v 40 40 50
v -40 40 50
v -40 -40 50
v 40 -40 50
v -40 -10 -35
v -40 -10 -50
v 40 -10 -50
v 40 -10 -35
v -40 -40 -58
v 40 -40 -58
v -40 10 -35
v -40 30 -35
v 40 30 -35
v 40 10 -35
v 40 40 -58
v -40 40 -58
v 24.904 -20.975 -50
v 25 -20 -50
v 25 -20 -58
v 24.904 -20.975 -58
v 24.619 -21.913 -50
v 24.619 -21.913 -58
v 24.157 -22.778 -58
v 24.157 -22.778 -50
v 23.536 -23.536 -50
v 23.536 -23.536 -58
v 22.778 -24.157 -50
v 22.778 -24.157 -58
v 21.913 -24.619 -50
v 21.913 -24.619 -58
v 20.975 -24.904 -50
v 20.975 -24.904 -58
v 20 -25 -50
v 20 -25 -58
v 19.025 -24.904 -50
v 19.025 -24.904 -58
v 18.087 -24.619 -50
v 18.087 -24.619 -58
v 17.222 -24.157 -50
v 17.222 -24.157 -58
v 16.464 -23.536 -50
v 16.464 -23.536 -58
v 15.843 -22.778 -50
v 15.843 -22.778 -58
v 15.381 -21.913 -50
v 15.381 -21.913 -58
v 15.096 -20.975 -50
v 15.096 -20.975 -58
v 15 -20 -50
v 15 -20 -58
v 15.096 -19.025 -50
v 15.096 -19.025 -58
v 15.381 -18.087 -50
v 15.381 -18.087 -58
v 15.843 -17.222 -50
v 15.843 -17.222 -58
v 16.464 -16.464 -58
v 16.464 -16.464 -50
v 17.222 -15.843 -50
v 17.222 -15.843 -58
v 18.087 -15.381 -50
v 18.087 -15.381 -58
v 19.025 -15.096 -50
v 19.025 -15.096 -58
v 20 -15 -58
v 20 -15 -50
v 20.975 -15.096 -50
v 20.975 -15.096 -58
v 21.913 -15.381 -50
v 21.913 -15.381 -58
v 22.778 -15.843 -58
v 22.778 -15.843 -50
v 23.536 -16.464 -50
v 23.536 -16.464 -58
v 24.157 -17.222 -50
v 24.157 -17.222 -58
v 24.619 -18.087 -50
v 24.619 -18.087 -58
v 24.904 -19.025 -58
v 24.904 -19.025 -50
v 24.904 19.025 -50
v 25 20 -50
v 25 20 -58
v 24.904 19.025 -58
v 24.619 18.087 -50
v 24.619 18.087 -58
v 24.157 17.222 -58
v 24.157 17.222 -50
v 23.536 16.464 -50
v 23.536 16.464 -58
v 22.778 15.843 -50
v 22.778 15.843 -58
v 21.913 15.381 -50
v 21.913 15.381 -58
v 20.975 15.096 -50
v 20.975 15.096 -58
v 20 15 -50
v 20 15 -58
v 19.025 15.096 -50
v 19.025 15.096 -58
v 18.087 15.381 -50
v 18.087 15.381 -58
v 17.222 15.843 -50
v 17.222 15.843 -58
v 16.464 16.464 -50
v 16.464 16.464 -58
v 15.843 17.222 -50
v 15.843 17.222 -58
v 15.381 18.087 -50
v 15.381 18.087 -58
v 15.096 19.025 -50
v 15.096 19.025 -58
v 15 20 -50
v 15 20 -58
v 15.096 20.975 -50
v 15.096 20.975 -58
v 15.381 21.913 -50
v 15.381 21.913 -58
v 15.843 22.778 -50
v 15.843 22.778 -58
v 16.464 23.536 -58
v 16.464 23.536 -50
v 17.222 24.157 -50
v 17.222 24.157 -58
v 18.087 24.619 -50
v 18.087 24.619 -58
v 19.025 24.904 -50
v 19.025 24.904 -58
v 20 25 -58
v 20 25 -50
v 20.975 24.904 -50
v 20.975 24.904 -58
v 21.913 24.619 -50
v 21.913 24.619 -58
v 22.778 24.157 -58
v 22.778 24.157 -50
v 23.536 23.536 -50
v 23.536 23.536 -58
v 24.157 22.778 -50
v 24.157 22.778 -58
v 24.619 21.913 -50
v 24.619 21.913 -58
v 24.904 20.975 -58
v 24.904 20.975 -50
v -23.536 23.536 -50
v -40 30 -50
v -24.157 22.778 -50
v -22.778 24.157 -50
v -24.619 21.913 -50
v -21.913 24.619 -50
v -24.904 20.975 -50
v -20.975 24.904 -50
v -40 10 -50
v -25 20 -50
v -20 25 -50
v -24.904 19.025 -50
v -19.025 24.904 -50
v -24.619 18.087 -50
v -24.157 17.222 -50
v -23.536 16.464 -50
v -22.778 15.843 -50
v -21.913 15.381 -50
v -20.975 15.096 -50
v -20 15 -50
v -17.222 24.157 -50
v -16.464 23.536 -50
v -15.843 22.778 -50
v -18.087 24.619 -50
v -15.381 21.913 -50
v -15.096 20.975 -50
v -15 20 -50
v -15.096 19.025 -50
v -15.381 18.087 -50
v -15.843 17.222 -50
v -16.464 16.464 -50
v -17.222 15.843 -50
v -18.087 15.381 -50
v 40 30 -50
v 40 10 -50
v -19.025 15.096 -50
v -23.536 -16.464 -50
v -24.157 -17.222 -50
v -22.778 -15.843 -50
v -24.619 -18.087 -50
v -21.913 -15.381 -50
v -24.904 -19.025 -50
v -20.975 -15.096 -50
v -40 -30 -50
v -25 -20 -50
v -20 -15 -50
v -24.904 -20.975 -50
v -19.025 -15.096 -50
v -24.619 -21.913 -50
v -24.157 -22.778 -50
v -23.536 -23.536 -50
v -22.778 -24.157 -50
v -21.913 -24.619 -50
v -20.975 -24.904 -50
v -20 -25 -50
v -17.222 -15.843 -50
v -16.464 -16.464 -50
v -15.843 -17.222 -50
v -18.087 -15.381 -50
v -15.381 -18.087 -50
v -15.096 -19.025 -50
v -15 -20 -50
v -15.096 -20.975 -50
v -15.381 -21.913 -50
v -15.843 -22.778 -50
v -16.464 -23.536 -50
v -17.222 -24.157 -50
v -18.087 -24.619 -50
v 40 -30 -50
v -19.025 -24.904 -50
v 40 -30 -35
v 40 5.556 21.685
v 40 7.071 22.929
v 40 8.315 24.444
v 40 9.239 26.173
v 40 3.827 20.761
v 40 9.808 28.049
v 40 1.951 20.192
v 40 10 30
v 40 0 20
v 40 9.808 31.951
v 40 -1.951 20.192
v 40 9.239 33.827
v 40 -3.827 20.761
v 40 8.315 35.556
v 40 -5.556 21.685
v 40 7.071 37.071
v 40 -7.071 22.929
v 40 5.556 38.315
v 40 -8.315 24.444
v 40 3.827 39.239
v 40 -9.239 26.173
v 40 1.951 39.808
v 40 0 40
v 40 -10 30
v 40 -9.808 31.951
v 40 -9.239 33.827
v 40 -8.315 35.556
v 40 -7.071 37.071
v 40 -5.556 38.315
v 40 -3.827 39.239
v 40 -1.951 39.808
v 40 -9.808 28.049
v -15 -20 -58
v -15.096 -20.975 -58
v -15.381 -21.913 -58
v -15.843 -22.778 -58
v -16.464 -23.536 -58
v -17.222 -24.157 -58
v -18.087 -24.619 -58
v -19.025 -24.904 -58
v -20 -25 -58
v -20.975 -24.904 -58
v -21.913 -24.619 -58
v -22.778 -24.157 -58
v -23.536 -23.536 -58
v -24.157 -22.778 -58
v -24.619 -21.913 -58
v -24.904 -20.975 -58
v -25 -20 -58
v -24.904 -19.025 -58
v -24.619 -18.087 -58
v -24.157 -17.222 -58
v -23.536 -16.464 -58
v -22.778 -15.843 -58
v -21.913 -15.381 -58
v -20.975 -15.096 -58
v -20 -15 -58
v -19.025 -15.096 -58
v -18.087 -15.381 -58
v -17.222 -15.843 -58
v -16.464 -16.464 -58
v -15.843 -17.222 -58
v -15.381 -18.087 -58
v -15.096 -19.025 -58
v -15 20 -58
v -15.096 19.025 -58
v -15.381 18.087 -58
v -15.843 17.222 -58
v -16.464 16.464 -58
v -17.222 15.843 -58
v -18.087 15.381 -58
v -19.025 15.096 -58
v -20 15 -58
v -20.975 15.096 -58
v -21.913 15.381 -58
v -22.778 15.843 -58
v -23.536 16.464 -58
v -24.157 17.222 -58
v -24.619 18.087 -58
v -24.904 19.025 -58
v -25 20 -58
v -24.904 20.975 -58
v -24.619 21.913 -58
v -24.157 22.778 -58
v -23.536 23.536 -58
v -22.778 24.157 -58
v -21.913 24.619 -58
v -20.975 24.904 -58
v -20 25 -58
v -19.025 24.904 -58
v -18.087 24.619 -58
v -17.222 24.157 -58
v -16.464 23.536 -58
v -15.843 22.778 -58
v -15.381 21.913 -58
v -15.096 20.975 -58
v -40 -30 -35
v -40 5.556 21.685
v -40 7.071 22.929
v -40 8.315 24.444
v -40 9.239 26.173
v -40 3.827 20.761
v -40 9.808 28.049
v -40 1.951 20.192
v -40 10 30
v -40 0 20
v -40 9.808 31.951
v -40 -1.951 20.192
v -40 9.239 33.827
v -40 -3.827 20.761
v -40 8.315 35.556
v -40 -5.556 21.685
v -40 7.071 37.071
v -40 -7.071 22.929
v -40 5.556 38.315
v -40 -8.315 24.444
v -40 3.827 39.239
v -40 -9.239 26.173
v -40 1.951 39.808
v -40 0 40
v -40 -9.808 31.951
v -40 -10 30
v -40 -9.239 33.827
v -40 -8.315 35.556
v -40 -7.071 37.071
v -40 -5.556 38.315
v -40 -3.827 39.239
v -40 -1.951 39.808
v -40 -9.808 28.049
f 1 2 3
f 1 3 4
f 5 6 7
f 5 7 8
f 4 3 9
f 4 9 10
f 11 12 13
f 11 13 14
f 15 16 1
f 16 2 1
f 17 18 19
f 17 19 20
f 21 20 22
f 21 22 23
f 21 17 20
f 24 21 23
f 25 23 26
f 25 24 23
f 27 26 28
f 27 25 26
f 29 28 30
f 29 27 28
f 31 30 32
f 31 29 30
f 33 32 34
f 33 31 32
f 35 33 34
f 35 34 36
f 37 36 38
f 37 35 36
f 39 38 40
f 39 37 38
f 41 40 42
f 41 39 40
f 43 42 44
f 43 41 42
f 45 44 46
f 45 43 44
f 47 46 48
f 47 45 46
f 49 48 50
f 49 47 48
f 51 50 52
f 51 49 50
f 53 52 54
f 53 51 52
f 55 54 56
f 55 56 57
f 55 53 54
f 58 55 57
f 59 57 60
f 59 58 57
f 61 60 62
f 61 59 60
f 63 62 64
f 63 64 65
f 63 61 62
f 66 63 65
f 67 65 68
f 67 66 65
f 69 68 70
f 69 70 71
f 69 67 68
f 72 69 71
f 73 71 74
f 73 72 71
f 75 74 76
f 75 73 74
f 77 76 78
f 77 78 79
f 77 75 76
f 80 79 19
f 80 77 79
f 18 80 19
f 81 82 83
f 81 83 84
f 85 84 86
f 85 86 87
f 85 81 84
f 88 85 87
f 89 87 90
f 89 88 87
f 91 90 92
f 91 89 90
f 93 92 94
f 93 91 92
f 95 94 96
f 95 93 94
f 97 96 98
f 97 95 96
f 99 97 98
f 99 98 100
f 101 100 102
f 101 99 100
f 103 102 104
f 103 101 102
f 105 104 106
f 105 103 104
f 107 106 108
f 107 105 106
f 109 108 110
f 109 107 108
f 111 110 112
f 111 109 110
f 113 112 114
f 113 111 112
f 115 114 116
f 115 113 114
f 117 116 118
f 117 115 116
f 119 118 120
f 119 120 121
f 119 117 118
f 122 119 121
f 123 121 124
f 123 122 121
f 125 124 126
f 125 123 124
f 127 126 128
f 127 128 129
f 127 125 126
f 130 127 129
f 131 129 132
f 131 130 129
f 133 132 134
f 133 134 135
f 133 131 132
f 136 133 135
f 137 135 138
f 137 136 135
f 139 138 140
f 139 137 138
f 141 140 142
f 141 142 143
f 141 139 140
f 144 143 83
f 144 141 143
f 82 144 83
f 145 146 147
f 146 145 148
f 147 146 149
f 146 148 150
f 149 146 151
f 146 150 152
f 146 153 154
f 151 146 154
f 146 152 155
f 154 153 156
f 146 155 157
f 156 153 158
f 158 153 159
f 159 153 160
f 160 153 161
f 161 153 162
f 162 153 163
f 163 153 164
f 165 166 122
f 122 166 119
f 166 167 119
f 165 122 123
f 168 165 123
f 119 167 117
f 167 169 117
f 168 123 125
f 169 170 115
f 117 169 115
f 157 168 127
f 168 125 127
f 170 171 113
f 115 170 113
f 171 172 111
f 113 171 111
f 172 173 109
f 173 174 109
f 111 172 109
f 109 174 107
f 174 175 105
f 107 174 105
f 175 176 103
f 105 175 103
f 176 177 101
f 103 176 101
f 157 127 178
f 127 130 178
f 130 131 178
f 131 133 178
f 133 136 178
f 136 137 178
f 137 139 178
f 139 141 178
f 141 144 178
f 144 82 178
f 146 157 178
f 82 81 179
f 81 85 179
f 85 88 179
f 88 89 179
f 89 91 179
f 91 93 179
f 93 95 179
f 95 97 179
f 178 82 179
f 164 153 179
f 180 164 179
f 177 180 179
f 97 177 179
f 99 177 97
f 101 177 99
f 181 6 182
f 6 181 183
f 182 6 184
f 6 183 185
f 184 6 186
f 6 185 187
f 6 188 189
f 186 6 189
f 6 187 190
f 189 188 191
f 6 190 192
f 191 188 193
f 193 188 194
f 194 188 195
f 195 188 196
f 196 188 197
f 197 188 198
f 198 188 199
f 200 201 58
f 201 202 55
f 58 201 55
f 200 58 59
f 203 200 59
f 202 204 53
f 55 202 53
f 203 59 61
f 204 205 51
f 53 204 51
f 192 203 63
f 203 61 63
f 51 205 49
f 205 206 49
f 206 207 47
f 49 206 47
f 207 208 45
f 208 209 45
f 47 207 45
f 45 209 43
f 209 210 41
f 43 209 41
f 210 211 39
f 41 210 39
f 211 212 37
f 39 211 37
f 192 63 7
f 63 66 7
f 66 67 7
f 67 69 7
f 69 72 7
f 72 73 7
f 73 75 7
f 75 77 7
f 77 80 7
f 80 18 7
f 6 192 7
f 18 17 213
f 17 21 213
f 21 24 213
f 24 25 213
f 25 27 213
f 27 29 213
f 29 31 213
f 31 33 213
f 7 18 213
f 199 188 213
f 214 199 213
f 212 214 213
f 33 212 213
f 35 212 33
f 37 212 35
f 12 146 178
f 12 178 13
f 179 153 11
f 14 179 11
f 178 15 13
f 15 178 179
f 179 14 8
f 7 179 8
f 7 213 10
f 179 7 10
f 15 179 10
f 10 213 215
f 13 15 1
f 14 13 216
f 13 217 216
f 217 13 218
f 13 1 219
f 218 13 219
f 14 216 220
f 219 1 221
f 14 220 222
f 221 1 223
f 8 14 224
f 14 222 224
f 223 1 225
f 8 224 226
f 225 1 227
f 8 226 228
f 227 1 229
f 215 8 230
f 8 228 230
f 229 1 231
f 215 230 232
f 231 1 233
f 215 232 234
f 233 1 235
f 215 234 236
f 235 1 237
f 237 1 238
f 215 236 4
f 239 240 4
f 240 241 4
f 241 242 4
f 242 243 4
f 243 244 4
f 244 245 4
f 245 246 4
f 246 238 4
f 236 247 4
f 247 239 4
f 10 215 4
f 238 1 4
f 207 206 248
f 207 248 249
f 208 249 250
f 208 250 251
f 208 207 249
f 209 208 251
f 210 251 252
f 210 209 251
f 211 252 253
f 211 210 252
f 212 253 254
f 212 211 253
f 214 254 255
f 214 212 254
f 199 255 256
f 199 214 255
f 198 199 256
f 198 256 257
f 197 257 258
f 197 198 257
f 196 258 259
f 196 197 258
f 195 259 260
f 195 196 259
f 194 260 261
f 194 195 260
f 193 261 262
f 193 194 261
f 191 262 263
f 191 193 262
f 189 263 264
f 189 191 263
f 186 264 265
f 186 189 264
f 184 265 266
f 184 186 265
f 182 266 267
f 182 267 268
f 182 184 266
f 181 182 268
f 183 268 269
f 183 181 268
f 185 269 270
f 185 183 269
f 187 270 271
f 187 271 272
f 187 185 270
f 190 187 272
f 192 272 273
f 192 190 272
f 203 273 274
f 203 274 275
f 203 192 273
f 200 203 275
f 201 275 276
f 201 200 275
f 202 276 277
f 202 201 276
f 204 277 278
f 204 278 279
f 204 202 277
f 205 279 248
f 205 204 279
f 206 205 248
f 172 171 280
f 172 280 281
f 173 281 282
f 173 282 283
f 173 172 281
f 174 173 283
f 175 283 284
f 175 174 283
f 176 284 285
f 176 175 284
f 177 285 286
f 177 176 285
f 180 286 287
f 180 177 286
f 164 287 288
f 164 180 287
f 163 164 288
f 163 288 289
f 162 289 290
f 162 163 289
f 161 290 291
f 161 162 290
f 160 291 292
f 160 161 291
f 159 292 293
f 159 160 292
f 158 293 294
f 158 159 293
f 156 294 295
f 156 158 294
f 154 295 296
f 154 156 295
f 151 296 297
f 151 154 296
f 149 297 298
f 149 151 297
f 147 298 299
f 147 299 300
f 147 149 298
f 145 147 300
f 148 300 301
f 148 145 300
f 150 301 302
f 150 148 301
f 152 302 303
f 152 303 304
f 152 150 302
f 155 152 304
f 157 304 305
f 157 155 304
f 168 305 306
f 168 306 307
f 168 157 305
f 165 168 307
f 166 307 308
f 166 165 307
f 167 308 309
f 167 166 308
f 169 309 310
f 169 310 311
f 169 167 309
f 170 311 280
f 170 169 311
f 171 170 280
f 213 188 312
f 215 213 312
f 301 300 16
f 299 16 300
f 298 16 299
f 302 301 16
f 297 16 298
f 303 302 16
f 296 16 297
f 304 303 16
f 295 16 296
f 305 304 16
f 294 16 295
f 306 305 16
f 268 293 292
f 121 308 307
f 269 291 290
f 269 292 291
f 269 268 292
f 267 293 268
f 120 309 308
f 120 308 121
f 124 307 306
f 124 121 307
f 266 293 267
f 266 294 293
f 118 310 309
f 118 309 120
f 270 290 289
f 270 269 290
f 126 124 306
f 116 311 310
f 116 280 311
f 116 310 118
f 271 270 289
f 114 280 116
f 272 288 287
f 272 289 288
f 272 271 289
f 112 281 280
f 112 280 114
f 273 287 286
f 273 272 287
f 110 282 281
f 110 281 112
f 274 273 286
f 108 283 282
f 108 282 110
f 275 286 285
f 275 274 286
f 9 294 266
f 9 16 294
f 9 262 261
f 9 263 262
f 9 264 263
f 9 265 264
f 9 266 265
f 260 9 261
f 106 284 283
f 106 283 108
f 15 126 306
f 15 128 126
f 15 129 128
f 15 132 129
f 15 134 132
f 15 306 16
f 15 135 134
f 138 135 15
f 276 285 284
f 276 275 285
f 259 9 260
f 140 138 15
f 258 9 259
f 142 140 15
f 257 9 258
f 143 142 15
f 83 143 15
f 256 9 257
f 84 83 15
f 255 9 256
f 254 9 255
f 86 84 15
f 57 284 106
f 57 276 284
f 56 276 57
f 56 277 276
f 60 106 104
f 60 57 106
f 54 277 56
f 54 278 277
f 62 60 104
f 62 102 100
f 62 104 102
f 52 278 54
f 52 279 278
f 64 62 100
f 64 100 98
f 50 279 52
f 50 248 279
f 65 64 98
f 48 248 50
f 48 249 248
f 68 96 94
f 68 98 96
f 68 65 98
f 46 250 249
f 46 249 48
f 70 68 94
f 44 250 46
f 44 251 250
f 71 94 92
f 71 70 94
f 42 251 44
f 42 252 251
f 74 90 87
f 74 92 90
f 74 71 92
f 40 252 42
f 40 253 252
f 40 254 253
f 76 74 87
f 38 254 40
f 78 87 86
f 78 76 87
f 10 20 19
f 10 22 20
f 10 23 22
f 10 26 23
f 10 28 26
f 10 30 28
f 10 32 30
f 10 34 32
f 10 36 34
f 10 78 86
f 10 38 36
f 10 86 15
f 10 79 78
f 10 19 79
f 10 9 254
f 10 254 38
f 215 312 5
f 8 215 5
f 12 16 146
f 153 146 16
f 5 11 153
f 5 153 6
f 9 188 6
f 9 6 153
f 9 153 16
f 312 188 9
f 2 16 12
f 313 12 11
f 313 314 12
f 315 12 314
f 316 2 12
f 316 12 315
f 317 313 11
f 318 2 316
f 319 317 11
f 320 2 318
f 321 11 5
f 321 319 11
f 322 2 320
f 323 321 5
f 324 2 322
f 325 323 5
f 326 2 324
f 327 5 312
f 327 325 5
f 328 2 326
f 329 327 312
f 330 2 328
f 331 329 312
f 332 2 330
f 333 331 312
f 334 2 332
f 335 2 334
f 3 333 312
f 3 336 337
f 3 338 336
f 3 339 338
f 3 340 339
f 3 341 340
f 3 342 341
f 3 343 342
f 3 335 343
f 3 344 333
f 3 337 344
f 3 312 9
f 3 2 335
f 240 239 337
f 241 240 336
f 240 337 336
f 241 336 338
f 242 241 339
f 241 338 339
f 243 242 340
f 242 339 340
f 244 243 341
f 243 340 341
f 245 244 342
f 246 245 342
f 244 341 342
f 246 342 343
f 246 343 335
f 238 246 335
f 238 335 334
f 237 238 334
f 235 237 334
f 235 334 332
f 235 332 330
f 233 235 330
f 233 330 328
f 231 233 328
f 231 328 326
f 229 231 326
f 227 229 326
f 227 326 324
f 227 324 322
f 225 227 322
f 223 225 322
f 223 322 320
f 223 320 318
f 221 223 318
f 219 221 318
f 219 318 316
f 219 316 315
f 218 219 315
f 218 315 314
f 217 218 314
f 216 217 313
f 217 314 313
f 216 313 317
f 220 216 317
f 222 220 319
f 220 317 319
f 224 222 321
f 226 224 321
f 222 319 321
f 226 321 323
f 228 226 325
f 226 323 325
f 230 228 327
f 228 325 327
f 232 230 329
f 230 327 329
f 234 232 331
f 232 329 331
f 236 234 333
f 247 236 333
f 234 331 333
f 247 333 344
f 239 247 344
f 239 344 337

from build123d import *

# Parameters (mm, degrees)
F0_W     = 80
F0_H     = 80
F1_DEPTH = 50
F2_R     = 5
F3_DEPTH = 10
F4_R     = 10
F5_DEPTH = 86.1
F6_W     = 20
F6_H     = 15
F7_DEPTH = 84.6
F2_W     = 80
F2_H     = 80
F8_DEPTH = 8


# Not quite as in the source:
# - a pattern or mirror of a feature is missing from the dataset's text; its kind, count and spacing are read off the source's solid


with BuildPart() as f1:
    # F0 (on Top) → F1 (new body, symmetric)
    with BuildSketch(Plane.XY):
        Rectangle(F0_W, F0_H)
    extrude(amount=F1_DEPTH, both=True)

    # F2 (on face) → F3 (cut)
    with BuildSketch(Plane(origin=(0, 0, -50), x_dir=(1, 0, 0), z_dir=(0, 0, -1))):
        with Locations((-20, 20)):
            Circle(F2_R)
        with Locations((-20, -20)):
            Circle(F2_R)
        with Locations((20, -20)):
            Circle(F2_R)
        with Locations((20, 20)):
            Circle(F2_R)
    extrude(amount=-F3_DEPTH, mode=Mode.SUBTRACT)

    # F4 (on face) → F5 (cut)
    with BuildSketch(Plane(origin=(-40, 0, 0), x_dir=(0, -1, 0), z_dir=(-1, 0, 0))):
        with Locations((0, 30)):
            Circle(F4_R)
    extrude(amount=-F5_DEPTH, mode=Mode.SUBTRACT)

    # F6 (on face) → F7 (cut)
    with BuildSketch(Plane(origin=(-40, 0, 0), x_dir=(0, -1, 0), z_dir=(-1, 0, 0))):
        with Locations((-20, -42.5)):
            Rectangle(F6_W, F6_H)
    f7 = extrude(amount=-F7_DEPTH, mode=Mode.SUBTRACT)

    # F7_copies: F7 across plane
    add(f7.mirror(Plane(origin=(0, 0, 0), x_dir=(0, 0, -1), z_dir=(0, -1, 0))), mode=Mode.SUBTRACT)

    # F2 (on face) → F8 (join)
    with BuildSketch(Plane(origin=(0, 0, -50), x_dir=(1, 0, 0), z_dir=(0, 0, -1))):
        Rectangle(F2_W, F2_H)
        with Locations((-20, -20)):
            Circle(F2_R, mode=Mode.SUBTRACT)
        with Locations((20, -20)):
            Circle(F2_R, mode=Mode.SUBTRACT)
        with Locations((-20, 20)):
            Circle(F2_R, mode=Mode.SUBTRACT)
        with Locations((20, 20)):
            Circle(F2_R, mode=Mode.SUBTRACT)
    extrude(amount=F8_DEPTH)


solid = f1.part
